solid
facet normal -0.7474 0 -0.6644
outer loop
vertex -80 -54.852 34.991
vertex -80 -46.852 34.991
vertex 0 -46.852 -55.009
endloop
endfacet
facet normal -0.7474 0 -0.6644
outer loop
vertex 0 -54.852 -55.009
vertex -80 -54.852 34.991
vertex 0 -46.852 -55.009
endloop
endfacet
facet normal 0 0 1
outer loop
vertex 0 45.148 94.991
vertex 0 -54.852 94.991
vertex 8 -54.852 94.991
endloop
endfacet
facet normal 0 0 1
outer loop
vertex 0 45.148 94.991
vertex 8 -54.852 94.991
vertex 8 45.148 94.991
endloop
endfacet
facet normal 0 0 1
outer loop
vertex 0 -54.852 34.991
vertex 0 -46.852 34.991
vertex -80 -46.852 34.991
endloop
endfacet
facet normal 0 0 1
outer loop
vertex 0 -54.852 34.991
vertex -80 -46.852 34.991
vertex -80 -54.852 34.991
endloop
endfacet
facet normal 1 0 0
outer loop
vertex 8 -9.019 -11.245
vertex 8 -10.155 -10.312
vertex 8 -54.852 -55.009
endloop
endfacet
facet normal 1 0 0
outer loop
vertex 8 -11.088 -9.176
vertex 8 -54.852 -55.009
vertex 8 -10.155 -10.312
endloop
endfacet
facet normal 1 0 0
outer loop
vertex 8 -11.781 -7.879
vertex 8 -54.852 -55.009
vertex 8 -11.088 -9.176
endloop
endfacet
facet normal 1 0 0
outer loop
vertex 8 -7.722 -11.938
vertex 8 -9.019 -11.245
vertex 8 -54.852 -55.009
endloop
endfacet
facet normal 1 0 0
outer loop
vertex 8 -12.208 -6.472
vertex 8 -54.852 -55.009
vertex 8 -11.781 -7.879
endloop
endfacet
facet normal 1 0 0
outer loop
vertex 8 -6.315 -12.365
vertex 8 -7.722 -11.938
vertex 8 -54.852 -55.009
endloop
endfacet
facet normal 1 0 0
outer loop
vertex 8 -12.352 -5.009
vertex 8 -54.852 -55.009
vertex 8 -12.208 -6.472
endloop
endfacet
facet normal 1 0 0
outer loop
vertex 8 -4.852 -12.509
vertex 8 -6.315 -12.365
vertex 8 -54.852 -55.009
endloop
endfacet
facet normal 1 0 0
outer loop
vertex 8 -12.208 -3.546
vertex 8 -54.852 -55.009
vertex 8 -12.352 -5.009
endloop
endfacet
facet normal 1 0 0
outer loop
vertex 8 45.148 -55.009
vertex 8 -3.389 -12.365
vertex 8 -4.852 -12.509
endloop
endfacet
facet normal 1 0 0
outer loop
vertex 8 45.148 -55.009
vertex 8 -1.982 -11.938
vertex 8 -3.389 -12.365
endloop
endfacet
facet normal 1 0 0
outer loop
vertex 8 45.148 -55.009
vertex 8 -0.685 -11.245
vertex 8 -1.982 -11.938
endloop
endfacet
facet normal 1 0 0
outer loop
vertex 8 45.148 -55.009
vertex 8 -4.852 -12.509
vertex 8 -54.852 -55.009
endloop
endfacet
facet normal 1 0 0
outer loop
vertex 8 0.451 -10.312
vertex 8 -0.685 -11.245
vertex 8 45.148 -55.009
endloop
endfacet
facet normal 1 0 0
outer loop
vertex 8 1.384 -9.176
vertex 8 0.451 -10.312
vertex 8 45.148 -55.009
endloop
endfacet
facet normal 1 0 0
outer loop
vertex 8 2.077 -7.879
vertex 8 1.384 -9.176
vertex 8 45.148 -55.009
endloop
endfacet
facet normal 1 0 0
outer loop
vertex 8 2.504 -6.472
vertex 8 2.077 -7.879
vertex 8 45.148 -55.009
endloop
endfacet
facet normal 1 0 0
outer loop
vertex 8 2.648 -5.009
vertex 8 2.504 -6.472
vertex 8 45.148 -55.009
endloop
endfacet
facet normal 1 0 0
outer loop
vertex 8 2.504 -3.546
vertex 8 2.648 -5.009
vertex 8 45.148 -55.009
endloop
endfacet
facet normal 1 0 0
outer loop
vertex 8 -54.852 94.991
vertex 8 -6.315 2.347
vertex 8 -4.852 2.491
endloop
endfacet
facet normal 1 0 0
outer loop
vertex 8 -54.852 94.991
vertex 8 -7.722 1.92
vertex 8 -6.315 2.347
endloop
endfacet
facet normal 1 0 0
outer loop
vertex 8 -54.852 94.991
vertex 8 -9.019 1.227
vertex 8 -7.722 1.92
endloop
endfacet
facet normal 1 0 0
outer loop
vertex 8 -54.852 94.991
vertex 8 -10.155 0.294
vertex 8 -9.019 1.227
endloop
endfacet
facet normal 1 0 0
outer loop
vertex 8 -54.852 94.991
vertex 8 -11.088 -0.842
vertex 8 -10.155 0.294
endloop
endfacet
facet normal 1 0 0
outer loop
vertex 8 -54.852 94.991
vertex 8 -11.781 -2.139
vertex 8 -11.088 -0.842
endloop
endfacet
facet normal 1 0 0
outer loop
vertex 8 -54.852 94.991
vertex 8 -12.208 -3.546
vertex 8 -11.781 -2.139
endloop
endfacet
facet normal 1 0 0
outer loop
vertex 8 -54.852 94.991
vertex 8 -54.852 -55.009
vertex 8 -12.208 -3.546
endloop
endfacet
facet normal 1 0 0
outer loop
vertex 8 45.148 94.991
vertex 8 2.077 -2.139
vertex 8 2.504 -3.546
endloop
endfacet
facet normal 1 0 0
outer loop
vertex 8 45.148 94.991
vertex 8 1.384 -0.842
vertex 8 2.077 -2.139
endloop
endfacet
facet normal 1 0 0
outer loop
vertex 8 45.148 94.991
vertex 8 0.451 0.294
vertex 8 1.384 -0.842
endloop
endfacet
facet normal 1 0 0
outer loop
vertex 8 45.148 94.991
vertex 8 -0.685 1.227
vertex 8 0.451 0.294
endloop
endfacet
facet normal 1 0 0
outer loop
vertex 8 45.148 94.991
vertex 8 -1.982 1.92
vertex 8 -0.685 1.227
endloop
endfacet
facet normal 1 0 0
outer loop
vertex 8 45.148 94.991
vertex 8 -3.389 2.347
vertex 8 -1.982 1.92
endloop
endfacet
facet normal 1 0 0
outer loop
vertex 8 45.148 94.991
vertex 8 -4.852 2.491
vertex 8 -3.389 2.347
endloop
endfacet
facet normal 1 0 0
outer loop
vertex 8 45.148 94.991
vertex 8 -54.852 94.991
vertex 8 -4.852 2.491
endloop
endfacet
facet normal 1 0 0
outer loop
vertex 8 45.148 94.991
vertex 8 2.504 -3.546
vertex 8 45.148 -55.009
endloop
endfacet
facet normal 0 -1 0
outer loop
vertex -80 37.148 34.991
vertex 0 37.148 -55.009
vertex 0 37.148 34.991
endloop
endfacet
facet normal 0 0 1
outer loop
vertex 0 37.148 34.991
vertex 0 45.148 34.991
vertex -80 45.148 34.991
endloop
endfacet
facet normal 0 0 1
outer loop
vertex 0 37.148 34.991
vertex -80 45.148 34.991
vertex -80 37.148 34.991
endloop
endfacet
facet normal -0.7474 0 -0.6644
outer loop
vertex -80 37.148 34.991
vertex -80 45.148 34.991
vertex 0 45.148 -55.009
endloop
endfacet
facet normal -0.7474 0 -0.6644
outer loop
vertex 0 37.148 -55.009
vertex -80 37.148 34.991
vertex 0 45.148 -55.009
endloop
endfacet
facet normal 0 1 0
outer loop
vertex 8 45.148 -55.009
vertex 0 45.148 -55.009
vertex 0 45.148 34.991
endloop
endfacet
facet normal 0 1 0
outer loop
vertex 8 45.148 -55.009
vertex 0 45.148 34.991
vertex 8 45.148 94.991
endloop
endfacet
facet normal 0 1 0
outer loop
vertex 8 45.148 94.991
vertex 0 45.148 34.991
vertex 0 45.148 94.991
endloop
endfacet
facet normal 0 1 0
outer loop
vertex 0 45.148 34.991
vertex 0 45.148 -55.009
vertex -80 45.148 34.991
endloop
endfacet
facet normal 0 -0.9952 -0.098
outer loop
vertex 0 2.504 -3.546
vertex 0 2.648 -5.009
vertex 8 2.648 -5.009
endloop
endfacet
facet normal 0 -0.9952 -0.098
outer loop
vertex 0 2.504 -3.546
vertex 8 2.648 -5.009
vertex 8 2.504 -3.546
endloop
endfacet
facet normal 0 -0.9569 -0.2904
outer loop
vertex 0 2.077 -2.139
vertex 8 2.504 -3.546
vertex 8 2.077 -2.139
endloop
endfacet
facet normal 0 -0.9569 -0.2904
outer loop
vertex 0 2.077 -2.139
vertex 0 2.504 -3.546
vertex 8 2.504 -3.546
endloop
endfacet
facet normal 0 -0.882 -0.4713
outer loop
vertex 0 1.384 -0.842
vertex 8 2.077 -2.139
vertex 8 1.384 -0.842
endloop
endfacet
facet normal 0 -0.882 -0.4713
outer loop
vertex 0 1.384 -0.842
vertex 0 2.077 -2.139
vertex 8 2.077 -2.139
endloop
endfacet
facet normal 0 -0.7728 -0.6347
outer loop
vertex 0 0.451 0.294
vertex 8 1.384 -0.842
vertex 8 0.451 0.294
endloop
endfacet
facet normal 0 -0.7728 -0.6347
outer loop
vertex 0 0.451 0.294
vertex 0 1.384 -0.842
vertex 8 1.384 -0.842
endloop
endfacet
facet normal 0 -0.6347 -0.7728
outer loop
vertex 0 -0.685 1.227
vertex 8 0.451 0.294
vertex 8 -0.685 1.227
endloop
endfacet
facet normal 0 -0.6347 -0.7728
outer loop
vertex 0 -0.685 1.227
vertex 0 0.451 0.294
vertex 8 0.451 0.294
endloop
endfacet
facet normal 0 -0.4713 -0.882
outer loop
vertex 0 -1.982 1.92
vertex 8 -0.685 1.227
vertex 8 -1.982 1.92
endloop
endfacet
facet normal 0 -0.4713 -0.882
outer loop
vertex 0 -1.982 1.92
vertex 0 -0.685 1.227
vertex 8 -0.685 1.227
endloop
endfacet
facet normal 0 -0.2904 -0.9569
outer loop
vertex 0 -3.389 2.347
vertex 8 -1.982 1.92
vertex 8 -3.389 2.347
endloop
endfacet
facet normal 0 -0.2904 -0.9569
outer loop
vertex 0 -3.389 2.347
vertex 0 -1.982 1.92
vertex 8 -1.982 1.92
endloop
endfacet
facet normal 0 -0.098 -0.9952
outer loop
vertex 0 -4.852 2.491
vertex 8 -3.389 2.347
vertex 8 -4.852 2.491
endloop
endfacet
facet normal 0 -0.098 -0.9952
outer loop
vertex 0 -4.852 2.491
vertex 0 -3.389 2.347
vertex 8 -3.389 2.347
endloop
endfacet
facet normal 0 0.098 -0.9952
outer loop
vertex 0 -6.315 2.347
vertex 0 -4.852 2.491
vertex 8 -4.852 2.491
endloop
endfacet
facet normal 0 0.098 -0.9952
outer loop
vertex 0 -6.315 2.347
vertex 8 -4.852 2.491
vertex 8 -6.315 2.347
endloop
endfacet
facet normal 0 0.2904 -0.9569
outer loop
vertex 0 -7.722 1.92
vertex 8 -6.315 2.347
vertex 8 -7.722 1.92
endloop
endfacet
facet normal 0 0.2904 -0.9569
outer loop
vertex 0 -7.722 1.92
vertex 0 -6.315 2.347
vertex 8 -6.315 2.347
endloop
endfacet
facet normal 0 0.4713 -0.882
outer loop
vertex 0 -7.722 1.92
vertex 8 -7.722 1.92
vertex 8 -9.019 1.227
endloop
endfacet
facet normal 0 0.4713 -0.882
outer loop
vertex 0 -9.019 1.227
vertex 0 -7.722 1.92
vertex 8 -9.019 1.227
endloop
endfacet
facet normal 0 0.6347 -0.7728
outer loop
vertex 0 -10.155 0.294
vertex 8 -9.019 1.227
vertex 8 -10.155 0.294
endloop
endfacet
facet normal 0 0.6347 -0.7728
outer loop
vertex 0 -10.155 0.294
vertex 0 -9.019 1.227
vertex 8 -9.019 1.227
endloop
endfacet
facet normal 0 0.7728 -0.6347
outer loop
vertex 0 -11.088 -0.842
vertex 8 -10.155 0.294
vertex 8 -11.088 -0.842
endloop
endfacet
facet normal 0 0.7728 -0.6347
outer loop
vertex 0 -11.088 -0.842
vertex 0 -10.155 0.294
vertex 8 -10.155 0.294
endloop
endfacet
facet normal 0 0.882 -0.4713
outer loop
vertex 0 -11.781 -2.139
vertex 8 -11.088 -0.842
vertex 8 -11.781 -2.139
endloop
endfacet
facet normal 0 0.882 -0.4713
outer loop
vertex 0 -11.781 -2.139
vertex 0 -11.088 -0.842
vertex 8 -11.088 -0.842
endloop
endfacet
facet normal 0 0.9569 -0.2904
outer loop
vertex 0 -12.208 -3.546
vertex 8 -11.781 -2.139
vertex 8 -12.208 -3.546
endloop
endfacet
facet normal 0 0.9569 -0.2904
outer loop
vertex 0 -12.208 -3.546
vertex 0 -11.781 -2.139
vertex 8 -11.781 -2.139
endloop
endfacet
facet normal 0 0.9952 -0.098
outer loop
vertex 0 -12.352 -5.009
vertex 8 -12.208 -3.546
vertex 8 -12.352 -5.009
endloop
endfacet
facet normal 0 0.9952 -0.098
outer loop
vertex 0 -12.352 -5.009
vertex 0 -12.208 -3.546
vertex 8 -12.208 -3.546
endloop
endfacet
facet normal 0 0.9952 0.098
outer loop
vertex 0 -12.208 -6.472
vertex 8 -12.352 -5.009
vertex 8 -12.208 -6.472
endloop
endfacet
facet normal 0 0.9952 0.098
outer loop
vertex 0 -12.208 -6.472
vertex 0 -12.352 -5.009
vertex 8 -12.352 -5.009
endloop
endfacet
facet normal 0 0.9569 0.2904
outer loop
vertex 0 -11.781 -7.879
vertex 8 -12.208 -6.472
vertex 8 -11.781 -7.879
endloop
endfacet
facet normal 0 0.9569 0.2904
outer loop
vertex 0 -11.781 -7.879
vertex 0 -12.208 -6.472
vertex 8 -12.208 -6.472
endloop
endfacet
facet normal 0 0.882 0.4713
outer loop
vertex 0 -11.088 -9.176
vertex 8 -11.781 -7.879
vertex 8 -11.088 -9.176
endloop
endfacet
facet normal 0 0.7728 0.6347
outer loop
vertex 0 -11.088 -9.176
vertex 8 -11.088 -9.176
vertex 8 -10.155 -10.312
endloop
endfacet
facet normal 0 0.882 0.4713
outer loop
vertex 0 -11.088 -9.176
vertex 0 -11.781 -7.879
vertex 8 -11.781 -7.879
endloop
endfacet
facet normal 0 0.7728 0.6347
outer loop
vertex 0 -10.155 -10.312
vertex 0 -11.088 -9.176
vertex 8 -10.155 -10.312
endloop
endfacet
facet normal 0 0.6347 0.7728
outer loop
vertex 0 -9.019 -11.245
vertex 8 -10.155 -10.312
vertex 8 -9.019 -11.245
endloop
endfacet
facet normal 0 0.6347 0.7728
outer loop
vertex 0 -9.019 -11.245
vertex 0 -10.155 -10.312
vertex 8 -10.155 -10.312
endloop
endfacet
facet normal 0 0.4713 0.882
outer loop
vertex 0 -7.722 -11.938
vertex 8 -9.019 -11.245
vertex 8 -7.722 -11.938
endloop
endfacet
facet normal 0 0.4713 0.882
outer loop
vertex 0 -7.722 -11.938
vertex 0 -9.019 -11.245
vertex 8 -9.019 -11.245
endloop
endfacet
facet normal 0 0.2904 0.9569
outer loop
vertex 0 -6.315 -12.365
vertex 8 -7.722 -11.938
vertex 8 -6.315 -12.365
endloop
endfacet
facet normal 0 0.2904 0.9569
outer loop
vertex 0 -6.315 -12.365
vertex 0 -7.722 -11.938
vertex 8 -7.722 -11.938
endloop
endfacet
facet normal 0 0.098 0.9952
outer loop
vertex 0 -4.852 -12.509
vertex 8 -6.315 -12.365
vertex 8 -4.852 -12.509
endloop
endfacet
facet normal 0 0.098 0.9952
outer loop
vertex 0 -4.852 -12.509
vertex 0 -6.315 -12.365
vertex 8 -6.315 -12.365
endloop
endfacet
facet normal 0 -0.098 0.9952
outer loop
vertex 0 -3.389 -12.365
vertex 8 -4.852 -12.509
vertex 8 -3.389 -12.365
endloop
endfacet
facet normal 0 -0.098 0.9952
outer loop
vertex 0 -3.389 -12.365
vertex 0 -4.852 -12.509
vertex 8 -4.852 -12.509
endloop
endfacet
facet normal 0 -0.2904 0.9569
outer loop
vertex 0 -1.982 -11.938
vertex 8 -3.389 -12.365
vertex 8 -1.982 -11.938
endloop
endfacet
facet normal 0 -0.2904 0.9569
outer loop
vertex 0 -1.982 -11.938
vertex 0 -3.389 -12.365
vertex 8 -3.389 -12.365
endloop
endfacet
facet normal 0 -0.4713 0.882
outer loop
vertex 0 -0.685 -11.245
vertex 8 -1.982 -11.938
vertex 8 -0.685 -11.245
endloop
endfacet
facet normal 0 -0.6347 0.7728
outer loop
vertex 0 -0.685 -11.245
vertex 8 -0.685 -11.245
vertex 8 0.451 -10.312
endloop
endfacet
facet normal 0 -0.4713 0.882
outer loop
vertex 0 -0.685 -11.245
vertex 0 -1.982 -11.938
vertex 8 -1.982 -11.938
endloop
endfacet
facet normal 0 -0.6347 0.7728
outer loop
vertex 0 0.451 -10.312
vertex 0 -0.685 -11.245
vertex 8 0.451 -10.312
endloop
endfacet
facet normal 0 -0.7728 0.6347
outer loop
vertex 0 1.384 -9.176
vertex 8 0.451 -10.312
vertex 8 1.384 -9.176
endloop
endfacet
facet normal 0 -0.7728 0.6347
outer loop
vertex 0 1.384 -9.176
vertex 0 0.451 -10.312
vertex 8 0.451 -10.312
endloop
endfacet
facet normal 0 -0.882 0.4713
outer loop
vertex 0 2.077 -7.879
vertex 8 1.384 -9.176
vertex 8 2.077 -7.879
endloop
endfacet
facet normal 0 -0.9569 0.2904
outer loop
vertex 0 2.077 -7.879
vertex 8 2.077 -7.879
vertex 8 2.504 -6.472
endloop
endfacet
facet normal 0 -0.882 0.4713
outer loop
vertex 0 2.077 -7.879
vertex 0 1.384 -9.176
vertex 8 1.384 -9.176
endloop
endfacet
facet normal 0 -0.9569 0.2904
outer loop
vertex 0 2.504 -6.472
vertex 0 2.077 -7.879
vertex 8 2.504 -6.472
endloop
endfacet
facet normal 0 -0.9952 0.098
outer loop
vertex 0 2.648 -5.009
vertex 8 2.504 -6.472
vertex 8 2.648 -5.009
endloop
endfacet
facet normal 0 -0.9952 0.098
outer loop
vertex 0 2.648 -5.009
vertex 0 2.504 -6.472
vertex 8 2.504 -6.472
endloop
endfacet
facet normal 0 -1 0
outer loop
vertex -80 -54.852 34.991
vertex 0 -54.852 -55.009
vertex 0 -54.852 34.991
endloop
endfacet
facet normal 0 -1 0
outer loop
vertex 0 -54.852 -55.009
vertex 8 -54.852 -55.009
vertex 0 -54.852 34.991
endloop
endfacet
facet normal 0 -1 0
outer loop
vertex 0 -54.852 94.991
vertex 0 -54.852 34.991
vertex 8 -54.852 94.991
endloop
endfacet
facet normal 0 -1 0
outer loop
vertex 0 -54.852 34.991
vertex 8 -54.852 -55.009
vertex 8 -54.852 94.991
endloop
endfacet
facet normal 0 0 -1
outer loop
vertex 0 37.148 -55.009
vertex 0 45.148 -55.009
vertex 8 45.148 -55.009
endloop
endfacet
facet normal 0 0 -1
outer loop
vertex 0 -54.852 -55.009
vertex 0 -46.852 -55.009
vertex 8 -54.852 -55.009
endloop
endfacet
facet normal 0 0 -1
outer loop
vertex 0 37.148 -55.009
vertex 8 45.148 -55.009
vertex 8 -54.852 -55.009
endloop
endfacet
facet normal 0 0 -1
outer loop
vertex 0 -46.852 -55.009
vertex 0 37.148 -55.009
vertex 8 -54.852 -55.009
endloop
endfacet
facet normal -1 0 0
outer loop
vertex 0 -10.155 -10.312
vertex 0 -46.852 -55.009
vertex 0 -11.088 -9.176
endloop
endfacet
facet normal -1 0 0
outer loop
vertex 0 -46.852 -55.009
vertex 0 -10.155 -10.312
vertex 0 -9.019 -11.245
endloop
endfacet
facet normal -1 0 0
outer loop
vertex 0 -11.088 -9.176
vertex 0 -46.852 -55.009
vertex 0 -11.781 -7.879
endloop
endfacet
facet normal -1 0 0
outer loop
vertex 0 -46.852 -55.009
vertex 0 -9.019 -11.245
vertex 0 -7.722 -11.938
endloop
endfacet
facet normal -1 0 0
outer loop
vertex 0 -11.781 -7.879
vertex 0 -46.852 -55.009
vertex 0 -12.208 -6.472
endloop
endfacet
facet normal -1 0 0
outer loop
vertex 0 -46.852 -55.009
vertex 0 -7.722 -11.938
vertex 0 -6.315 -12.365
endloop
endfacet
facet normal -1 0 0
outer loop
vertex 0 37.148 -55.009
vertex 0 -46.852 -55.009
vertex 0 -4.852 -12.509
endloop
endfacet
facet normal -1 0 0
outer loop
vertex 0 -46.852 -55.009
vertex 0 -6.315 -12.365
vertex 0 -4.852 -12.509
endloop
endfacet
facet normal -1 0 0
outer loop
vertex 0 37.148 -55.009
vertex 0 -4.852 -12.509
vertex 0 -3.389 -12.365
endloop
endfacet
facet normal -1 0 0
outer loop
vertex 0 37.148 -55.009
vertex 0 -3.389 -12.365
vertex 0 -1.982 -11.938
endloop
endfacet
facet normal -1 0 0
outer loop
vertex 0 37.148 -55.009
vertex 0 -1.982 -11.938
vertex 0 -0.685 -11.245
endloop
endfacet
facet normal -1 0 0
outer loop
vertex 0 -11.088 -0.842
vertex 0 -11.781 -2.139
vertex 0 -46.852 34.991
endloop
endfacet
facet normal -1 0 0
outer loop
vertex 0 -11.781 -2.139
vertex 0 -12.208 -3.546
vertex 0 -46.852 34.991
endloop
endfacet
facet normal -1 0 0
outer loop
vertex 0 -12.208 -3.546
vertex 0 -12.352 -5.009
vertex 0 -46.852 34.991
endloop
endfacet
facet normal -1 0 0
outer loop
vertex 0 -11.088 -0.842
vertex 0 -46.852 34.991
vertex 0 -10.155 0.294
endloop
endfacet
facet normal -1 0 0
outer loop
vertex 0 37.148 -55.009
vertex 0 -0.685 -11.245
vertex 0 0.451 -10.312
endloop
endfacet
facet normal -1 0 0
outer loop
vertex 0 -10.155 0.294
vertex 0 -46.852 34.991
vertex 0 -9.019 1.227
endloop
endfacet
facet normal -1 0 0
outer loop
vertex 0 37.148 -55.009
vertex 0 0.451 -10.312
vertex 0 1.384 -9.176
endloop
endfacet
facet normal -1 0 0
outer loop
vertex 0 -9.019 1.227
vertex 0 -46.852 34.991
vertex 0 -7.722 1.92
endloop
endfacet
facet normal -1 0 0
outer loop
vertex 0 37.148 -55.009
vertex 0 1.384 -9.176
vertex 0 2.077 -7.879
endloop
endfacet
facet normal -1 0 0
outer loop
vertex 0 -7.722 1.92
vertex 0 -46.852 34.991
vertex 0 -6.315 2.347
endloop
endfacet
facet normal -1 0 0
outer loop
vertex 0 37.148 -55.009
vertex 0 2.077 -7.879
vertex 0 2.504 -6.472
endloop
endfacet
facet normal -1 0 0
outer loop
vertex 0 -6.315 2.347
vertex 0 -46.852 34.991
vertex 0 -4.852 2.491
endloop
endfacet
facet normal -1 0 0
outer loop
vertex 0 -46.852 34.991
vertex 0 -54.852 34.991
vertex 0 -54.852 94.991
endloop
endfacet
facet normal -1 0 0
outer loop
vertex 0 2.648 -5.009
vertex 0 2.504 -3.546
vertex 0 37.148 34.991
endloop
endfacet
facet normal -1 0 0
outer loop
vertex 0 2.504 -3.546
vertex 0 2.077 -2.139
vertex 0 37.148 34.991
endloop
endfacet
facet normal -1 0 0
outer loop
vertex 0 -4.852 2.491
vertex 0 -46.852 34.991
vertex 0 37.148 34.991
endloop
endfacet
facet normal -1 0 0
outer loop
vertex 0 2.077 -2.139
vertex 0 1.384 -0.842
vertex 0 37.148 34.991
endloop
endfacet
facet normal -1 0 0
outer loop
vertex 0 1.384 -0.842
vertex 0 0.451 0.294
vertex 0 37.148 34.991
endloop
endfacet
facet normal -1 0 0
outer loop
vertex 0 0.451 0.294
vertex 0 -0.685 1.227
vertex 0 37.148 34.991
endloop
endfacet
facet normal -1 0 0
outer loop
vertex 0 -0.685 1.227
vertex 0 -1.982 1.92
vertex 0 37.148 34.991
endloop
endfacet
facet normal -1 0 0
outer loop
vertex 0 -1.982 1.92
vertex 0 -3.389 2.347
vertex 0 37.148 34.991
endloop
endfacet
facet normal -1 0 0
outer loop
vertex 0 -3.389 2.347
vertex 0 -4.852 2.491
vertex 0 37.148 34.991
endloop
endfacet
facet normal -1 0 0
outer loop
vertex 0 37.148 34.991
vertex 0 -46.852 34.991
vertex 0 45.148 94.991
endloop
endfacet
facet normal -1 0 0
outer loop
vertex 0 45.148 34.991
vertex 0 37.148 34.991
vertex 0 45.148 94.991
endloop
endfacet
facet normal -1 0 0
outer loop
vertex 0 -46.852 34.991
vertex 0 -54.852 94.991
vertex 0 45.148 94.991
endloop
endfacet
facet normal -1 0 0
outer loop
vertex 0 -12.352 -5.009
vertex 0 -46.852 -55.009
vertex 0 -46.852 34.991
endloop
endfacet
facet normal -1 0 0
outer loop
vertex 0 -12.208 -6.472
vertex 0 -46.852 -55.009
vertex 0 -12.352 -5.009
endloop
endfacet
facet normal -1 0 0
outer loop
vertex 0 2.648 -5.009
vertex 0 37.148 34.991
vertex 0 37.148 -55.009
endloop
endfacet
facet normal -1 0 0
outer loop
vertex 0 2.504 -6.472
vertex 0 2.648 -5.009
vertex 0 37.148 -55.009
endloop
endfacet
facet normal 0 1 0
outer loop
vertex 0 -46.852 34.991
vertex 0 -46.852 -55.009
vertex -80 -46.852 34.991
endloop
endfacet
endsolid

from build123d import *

# Parameters (mm, degrees)
F0_W     = 100
F0_H     = 150
F0_R     = 7.5
F1_DEPTH = 8
F2_W     = 8
F2_H     = 90
F3_DEPTH = 80
F5_DEPTH = 100.001


with BuildPart() as f1:
    # F0 (on Right) → F1 (new body)
    with BuildSketch(Plane.YZ):
        with Locations((-4.851894, 19.991098)):
            Rectangle(F0_W, F0_H)
        with Locations((-4.851894, -5.008902)):
            Circle(F0_R, mode=Mode.SUBTRACT)
    extrude(amount=F1_DEPTH)

    # F2 (on face) → F3 (join)
    with BuildSketch(Plane(origin=(0, 0, 0), x_dir=(0, -1, 0), z_dir=(-1, 0, 0))):
        with Locations((50.851894, -10.008902)):
            Rectangle(F2_W, F2_H)
        with Locations((-41.148106, -10.008902)):
            Rectangle(F2_W, F2_H)
    extrude(amount=F3_DEPTH)

    # F4 (on face) → F5 (cut, through all)
    with BuildSketch(Plane(origin=(0, 45.148106, 0), x_dir=(-1, 0, 0), z_dir=(0, 1, 0))):
        Polygon((80, -55.008902), (80, 34.991098), (0, -55.008902), align=None)
    extrude(amount=-F5_DEPTH, mode=Mode.SUBTRACT)


solid = f1.part
